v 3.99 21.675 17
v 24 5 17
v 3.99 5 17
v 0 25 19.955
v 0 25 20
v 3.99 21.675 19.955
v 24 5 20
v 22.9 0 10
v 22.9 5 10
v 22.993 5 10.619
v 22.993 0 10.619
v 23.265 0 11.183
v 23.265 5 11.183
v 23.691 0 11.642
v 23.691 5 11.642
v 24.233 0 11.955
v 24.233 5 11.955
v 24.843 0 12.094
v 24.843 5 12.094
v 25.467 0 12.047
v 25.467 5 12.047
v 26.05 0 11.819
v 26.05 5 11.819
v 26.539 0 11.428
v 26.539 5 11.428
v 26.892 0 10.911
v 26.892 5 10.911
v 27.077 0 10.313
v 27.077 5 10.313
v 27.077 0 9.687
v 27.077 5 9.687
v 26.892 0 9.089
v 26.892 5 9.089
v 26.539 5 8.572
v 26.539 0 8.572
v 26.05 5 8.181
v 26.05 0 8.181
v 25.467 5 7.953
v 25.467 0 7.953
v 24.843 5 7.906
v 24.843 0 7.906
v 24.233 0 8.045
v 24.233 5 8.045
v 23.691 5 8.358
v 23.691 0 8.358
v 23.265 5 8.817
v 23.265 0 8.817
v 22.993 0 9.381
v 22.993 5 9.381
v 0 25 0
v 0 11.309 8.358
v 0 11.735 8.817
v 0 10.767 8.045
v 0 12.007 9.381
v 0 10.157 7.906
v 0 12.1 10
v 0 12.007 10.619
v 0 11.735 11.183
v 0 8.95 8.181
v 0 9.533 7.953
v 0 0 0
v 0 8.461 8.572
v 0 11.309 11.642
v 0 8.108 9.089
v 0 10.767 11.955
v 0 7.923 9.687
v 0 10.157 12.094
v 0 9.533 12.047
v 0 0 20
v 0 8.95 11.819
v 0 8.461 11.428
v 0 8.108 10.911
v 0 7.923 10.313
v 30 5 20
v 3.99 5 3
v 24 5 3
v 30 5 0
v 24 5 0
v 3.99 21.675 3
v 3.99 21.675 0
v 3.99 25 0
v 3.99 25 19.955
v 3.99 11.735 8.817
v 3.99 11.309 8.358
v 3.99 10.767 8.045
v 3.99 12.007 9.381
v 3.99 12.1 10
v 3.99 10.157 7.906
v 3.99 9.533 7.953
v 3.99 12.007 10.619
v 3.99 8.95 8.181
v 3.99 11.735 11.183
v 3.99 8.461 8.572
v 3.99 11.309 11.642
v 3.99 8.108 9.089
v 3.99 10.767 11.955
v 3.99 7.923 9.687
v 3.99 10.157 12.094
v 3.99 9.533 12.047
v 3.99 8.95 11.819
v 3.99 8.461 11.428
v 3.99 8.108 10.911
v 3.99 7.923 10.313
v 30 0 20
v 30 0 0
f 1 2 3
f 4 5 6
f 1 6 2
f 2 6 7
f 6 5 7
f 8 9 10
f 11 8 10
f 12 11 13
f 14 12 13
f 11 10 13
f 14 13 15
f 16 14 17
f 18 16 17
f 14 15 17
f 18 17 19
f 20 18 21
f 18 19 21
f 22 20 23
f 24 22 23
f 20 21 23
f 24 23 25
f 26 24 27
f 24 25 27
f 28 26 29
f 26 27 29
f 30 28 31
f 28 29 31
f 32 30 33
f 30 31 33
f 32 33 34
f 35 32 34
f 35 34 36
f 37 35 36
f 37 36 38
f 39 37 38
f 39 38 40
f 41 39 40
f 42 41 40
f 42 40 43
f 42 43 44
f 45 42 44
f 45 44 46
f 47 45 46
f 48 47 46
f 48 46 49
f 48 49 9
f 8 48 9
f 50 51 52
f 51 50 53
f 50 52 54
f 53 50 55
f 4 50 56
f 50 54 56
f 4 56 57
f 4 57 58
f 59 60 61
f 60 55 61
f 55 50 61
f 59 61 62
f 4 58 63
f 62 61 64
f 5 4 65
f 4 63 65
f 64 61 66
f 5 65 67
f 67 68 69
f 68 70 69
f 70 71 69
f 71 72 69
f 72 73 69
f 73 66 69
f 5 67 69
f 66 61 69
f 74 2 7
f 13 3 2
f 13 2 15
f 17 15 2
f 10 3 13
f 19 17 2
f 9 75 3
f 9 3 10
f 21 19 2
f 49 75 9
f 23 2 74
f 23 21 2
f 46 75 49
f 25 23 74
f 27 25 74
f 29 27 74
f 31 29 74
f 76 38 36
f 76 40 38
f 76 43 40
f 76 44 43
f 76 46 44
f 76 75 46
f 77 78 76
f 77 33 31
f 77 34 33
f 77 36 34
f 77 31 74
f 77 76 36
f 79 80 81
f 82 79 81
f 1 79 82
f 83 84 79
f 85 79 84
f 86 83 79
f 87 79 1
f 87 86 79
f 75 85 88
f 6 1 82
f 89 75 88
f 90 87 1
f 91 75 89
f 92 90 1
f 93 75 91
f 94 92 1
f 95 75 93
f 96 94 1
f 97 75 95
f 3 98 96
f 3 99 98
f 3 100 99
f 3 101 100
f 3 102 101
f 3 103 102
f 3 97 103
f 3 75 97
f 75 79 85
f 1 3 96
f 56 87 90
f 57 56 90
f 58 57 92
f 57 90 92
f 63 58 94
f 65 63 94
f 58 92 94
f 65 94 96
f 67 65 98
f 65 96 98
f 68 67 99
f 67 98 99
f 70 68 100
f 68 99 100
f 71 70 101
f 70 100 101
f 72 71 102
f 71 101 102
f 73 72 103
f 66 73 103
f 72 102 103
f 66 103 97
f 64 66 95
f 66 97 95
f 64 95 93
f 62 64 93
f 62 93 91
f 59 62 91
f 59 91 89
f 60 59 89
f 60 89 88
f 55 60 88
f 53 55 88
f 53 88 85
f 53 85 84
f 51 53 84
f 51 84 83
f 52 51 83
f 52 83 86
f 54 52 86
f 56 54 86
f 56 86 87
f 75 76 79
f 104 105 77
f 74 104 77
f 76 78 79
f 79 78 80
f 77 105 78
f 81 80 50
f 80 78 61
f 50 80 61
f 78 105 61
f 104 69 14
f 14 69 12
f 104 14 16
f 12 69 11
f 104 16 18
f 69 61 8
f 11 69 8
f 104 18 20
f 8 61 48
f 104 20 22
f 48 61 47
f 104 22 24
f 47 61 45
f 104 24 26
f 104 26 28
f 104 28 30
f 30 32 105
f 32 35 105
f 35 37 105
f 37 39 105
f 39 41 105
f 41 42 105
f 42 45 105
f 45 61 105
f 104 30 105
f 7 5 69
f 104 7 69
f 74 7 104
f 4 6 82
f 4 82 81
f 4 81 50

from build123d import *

# Parameters (mm, degrees)
SKETCH_W        = 30
SKETCH_H        = 5
PAD_DEPTH       = 20
SKETCH001_W     = 3.989674
SKETCH001_H     = 19.955276
PAD001_DEPTH    = 20
PAD002_DEPTH    = 3
PAD003_DEPTH    = 3
SKETCH004_R     = 2.1
POCKET_DEPTH    = 10
SKETCH005_R     = 2.1
POCKET001_DEPTH = 8


with BuildPart() as part:
    # Sketch → Pad (new body)
    with BuildSketch(Plane.XY):
        with Locations((15, 2.5)):
            Rectangle(SKETCH_W, SKETCH_H)
    extrude(amount=PAD_DEPTH)

    # Sketch001 (on Face3 of Pad) → Pad001 (join)
    with BuildSketch(Plane(origin=(0, 5, 0), x_dir=(-1, 0, 0), z_dir=(0, 1, 0))):
        with Locations((-1.994837, 9.977638)):
            Rectangle(SKETCH001_W, SKETCH001_H)
    extrude(amount=PAD001_DEPTH)

    # Sketch002 (on DatumPlane) → Pad002 (join)
    with BuildSketch(Plane(origin=(0, 0, 0), x_dir=(1, 0, 0), z_dir=(0, 0, -1))):
        Polygon((0, 0), (30, 0), (0, -25), align=None)
    extrude(amount=-PAD002_DEPTH)

    # Sketch003 (on DatumPlane) → Pad003 (join)
    with BuildSketch(Plane.XY.offset(20)):
        Polygon((0, 0), (0, 25), (30, 0), align=None)
    extrude(amount=-PAD003_DEPTH)

    # Sketch004 (on Face19 of Pad003) → Pocket (cut)
    with BuildSketch(Plane.YZ.offset(3.989674)):
        with Locations((10, 10)):
            Circle(SKETCH004_R)
    extrude(amount=-POCKET_DEPTH, mode=Mode.SUBTRACT)

    # Sketch005 (on Face10 of Pocket) → Pocket001 (cut)
    with BuildSketch(Plane(origin=(0, 5, 0), x_dir=(-1, 0, 0), z_dir=(0, 1, 0))):
        with Locations((-25, 10)):
            Circle(SKETCH005_R)
    extrude(amount=-POCKET001_DEPTH, mode=Mode.SUBTRACT)


solid = part.part
